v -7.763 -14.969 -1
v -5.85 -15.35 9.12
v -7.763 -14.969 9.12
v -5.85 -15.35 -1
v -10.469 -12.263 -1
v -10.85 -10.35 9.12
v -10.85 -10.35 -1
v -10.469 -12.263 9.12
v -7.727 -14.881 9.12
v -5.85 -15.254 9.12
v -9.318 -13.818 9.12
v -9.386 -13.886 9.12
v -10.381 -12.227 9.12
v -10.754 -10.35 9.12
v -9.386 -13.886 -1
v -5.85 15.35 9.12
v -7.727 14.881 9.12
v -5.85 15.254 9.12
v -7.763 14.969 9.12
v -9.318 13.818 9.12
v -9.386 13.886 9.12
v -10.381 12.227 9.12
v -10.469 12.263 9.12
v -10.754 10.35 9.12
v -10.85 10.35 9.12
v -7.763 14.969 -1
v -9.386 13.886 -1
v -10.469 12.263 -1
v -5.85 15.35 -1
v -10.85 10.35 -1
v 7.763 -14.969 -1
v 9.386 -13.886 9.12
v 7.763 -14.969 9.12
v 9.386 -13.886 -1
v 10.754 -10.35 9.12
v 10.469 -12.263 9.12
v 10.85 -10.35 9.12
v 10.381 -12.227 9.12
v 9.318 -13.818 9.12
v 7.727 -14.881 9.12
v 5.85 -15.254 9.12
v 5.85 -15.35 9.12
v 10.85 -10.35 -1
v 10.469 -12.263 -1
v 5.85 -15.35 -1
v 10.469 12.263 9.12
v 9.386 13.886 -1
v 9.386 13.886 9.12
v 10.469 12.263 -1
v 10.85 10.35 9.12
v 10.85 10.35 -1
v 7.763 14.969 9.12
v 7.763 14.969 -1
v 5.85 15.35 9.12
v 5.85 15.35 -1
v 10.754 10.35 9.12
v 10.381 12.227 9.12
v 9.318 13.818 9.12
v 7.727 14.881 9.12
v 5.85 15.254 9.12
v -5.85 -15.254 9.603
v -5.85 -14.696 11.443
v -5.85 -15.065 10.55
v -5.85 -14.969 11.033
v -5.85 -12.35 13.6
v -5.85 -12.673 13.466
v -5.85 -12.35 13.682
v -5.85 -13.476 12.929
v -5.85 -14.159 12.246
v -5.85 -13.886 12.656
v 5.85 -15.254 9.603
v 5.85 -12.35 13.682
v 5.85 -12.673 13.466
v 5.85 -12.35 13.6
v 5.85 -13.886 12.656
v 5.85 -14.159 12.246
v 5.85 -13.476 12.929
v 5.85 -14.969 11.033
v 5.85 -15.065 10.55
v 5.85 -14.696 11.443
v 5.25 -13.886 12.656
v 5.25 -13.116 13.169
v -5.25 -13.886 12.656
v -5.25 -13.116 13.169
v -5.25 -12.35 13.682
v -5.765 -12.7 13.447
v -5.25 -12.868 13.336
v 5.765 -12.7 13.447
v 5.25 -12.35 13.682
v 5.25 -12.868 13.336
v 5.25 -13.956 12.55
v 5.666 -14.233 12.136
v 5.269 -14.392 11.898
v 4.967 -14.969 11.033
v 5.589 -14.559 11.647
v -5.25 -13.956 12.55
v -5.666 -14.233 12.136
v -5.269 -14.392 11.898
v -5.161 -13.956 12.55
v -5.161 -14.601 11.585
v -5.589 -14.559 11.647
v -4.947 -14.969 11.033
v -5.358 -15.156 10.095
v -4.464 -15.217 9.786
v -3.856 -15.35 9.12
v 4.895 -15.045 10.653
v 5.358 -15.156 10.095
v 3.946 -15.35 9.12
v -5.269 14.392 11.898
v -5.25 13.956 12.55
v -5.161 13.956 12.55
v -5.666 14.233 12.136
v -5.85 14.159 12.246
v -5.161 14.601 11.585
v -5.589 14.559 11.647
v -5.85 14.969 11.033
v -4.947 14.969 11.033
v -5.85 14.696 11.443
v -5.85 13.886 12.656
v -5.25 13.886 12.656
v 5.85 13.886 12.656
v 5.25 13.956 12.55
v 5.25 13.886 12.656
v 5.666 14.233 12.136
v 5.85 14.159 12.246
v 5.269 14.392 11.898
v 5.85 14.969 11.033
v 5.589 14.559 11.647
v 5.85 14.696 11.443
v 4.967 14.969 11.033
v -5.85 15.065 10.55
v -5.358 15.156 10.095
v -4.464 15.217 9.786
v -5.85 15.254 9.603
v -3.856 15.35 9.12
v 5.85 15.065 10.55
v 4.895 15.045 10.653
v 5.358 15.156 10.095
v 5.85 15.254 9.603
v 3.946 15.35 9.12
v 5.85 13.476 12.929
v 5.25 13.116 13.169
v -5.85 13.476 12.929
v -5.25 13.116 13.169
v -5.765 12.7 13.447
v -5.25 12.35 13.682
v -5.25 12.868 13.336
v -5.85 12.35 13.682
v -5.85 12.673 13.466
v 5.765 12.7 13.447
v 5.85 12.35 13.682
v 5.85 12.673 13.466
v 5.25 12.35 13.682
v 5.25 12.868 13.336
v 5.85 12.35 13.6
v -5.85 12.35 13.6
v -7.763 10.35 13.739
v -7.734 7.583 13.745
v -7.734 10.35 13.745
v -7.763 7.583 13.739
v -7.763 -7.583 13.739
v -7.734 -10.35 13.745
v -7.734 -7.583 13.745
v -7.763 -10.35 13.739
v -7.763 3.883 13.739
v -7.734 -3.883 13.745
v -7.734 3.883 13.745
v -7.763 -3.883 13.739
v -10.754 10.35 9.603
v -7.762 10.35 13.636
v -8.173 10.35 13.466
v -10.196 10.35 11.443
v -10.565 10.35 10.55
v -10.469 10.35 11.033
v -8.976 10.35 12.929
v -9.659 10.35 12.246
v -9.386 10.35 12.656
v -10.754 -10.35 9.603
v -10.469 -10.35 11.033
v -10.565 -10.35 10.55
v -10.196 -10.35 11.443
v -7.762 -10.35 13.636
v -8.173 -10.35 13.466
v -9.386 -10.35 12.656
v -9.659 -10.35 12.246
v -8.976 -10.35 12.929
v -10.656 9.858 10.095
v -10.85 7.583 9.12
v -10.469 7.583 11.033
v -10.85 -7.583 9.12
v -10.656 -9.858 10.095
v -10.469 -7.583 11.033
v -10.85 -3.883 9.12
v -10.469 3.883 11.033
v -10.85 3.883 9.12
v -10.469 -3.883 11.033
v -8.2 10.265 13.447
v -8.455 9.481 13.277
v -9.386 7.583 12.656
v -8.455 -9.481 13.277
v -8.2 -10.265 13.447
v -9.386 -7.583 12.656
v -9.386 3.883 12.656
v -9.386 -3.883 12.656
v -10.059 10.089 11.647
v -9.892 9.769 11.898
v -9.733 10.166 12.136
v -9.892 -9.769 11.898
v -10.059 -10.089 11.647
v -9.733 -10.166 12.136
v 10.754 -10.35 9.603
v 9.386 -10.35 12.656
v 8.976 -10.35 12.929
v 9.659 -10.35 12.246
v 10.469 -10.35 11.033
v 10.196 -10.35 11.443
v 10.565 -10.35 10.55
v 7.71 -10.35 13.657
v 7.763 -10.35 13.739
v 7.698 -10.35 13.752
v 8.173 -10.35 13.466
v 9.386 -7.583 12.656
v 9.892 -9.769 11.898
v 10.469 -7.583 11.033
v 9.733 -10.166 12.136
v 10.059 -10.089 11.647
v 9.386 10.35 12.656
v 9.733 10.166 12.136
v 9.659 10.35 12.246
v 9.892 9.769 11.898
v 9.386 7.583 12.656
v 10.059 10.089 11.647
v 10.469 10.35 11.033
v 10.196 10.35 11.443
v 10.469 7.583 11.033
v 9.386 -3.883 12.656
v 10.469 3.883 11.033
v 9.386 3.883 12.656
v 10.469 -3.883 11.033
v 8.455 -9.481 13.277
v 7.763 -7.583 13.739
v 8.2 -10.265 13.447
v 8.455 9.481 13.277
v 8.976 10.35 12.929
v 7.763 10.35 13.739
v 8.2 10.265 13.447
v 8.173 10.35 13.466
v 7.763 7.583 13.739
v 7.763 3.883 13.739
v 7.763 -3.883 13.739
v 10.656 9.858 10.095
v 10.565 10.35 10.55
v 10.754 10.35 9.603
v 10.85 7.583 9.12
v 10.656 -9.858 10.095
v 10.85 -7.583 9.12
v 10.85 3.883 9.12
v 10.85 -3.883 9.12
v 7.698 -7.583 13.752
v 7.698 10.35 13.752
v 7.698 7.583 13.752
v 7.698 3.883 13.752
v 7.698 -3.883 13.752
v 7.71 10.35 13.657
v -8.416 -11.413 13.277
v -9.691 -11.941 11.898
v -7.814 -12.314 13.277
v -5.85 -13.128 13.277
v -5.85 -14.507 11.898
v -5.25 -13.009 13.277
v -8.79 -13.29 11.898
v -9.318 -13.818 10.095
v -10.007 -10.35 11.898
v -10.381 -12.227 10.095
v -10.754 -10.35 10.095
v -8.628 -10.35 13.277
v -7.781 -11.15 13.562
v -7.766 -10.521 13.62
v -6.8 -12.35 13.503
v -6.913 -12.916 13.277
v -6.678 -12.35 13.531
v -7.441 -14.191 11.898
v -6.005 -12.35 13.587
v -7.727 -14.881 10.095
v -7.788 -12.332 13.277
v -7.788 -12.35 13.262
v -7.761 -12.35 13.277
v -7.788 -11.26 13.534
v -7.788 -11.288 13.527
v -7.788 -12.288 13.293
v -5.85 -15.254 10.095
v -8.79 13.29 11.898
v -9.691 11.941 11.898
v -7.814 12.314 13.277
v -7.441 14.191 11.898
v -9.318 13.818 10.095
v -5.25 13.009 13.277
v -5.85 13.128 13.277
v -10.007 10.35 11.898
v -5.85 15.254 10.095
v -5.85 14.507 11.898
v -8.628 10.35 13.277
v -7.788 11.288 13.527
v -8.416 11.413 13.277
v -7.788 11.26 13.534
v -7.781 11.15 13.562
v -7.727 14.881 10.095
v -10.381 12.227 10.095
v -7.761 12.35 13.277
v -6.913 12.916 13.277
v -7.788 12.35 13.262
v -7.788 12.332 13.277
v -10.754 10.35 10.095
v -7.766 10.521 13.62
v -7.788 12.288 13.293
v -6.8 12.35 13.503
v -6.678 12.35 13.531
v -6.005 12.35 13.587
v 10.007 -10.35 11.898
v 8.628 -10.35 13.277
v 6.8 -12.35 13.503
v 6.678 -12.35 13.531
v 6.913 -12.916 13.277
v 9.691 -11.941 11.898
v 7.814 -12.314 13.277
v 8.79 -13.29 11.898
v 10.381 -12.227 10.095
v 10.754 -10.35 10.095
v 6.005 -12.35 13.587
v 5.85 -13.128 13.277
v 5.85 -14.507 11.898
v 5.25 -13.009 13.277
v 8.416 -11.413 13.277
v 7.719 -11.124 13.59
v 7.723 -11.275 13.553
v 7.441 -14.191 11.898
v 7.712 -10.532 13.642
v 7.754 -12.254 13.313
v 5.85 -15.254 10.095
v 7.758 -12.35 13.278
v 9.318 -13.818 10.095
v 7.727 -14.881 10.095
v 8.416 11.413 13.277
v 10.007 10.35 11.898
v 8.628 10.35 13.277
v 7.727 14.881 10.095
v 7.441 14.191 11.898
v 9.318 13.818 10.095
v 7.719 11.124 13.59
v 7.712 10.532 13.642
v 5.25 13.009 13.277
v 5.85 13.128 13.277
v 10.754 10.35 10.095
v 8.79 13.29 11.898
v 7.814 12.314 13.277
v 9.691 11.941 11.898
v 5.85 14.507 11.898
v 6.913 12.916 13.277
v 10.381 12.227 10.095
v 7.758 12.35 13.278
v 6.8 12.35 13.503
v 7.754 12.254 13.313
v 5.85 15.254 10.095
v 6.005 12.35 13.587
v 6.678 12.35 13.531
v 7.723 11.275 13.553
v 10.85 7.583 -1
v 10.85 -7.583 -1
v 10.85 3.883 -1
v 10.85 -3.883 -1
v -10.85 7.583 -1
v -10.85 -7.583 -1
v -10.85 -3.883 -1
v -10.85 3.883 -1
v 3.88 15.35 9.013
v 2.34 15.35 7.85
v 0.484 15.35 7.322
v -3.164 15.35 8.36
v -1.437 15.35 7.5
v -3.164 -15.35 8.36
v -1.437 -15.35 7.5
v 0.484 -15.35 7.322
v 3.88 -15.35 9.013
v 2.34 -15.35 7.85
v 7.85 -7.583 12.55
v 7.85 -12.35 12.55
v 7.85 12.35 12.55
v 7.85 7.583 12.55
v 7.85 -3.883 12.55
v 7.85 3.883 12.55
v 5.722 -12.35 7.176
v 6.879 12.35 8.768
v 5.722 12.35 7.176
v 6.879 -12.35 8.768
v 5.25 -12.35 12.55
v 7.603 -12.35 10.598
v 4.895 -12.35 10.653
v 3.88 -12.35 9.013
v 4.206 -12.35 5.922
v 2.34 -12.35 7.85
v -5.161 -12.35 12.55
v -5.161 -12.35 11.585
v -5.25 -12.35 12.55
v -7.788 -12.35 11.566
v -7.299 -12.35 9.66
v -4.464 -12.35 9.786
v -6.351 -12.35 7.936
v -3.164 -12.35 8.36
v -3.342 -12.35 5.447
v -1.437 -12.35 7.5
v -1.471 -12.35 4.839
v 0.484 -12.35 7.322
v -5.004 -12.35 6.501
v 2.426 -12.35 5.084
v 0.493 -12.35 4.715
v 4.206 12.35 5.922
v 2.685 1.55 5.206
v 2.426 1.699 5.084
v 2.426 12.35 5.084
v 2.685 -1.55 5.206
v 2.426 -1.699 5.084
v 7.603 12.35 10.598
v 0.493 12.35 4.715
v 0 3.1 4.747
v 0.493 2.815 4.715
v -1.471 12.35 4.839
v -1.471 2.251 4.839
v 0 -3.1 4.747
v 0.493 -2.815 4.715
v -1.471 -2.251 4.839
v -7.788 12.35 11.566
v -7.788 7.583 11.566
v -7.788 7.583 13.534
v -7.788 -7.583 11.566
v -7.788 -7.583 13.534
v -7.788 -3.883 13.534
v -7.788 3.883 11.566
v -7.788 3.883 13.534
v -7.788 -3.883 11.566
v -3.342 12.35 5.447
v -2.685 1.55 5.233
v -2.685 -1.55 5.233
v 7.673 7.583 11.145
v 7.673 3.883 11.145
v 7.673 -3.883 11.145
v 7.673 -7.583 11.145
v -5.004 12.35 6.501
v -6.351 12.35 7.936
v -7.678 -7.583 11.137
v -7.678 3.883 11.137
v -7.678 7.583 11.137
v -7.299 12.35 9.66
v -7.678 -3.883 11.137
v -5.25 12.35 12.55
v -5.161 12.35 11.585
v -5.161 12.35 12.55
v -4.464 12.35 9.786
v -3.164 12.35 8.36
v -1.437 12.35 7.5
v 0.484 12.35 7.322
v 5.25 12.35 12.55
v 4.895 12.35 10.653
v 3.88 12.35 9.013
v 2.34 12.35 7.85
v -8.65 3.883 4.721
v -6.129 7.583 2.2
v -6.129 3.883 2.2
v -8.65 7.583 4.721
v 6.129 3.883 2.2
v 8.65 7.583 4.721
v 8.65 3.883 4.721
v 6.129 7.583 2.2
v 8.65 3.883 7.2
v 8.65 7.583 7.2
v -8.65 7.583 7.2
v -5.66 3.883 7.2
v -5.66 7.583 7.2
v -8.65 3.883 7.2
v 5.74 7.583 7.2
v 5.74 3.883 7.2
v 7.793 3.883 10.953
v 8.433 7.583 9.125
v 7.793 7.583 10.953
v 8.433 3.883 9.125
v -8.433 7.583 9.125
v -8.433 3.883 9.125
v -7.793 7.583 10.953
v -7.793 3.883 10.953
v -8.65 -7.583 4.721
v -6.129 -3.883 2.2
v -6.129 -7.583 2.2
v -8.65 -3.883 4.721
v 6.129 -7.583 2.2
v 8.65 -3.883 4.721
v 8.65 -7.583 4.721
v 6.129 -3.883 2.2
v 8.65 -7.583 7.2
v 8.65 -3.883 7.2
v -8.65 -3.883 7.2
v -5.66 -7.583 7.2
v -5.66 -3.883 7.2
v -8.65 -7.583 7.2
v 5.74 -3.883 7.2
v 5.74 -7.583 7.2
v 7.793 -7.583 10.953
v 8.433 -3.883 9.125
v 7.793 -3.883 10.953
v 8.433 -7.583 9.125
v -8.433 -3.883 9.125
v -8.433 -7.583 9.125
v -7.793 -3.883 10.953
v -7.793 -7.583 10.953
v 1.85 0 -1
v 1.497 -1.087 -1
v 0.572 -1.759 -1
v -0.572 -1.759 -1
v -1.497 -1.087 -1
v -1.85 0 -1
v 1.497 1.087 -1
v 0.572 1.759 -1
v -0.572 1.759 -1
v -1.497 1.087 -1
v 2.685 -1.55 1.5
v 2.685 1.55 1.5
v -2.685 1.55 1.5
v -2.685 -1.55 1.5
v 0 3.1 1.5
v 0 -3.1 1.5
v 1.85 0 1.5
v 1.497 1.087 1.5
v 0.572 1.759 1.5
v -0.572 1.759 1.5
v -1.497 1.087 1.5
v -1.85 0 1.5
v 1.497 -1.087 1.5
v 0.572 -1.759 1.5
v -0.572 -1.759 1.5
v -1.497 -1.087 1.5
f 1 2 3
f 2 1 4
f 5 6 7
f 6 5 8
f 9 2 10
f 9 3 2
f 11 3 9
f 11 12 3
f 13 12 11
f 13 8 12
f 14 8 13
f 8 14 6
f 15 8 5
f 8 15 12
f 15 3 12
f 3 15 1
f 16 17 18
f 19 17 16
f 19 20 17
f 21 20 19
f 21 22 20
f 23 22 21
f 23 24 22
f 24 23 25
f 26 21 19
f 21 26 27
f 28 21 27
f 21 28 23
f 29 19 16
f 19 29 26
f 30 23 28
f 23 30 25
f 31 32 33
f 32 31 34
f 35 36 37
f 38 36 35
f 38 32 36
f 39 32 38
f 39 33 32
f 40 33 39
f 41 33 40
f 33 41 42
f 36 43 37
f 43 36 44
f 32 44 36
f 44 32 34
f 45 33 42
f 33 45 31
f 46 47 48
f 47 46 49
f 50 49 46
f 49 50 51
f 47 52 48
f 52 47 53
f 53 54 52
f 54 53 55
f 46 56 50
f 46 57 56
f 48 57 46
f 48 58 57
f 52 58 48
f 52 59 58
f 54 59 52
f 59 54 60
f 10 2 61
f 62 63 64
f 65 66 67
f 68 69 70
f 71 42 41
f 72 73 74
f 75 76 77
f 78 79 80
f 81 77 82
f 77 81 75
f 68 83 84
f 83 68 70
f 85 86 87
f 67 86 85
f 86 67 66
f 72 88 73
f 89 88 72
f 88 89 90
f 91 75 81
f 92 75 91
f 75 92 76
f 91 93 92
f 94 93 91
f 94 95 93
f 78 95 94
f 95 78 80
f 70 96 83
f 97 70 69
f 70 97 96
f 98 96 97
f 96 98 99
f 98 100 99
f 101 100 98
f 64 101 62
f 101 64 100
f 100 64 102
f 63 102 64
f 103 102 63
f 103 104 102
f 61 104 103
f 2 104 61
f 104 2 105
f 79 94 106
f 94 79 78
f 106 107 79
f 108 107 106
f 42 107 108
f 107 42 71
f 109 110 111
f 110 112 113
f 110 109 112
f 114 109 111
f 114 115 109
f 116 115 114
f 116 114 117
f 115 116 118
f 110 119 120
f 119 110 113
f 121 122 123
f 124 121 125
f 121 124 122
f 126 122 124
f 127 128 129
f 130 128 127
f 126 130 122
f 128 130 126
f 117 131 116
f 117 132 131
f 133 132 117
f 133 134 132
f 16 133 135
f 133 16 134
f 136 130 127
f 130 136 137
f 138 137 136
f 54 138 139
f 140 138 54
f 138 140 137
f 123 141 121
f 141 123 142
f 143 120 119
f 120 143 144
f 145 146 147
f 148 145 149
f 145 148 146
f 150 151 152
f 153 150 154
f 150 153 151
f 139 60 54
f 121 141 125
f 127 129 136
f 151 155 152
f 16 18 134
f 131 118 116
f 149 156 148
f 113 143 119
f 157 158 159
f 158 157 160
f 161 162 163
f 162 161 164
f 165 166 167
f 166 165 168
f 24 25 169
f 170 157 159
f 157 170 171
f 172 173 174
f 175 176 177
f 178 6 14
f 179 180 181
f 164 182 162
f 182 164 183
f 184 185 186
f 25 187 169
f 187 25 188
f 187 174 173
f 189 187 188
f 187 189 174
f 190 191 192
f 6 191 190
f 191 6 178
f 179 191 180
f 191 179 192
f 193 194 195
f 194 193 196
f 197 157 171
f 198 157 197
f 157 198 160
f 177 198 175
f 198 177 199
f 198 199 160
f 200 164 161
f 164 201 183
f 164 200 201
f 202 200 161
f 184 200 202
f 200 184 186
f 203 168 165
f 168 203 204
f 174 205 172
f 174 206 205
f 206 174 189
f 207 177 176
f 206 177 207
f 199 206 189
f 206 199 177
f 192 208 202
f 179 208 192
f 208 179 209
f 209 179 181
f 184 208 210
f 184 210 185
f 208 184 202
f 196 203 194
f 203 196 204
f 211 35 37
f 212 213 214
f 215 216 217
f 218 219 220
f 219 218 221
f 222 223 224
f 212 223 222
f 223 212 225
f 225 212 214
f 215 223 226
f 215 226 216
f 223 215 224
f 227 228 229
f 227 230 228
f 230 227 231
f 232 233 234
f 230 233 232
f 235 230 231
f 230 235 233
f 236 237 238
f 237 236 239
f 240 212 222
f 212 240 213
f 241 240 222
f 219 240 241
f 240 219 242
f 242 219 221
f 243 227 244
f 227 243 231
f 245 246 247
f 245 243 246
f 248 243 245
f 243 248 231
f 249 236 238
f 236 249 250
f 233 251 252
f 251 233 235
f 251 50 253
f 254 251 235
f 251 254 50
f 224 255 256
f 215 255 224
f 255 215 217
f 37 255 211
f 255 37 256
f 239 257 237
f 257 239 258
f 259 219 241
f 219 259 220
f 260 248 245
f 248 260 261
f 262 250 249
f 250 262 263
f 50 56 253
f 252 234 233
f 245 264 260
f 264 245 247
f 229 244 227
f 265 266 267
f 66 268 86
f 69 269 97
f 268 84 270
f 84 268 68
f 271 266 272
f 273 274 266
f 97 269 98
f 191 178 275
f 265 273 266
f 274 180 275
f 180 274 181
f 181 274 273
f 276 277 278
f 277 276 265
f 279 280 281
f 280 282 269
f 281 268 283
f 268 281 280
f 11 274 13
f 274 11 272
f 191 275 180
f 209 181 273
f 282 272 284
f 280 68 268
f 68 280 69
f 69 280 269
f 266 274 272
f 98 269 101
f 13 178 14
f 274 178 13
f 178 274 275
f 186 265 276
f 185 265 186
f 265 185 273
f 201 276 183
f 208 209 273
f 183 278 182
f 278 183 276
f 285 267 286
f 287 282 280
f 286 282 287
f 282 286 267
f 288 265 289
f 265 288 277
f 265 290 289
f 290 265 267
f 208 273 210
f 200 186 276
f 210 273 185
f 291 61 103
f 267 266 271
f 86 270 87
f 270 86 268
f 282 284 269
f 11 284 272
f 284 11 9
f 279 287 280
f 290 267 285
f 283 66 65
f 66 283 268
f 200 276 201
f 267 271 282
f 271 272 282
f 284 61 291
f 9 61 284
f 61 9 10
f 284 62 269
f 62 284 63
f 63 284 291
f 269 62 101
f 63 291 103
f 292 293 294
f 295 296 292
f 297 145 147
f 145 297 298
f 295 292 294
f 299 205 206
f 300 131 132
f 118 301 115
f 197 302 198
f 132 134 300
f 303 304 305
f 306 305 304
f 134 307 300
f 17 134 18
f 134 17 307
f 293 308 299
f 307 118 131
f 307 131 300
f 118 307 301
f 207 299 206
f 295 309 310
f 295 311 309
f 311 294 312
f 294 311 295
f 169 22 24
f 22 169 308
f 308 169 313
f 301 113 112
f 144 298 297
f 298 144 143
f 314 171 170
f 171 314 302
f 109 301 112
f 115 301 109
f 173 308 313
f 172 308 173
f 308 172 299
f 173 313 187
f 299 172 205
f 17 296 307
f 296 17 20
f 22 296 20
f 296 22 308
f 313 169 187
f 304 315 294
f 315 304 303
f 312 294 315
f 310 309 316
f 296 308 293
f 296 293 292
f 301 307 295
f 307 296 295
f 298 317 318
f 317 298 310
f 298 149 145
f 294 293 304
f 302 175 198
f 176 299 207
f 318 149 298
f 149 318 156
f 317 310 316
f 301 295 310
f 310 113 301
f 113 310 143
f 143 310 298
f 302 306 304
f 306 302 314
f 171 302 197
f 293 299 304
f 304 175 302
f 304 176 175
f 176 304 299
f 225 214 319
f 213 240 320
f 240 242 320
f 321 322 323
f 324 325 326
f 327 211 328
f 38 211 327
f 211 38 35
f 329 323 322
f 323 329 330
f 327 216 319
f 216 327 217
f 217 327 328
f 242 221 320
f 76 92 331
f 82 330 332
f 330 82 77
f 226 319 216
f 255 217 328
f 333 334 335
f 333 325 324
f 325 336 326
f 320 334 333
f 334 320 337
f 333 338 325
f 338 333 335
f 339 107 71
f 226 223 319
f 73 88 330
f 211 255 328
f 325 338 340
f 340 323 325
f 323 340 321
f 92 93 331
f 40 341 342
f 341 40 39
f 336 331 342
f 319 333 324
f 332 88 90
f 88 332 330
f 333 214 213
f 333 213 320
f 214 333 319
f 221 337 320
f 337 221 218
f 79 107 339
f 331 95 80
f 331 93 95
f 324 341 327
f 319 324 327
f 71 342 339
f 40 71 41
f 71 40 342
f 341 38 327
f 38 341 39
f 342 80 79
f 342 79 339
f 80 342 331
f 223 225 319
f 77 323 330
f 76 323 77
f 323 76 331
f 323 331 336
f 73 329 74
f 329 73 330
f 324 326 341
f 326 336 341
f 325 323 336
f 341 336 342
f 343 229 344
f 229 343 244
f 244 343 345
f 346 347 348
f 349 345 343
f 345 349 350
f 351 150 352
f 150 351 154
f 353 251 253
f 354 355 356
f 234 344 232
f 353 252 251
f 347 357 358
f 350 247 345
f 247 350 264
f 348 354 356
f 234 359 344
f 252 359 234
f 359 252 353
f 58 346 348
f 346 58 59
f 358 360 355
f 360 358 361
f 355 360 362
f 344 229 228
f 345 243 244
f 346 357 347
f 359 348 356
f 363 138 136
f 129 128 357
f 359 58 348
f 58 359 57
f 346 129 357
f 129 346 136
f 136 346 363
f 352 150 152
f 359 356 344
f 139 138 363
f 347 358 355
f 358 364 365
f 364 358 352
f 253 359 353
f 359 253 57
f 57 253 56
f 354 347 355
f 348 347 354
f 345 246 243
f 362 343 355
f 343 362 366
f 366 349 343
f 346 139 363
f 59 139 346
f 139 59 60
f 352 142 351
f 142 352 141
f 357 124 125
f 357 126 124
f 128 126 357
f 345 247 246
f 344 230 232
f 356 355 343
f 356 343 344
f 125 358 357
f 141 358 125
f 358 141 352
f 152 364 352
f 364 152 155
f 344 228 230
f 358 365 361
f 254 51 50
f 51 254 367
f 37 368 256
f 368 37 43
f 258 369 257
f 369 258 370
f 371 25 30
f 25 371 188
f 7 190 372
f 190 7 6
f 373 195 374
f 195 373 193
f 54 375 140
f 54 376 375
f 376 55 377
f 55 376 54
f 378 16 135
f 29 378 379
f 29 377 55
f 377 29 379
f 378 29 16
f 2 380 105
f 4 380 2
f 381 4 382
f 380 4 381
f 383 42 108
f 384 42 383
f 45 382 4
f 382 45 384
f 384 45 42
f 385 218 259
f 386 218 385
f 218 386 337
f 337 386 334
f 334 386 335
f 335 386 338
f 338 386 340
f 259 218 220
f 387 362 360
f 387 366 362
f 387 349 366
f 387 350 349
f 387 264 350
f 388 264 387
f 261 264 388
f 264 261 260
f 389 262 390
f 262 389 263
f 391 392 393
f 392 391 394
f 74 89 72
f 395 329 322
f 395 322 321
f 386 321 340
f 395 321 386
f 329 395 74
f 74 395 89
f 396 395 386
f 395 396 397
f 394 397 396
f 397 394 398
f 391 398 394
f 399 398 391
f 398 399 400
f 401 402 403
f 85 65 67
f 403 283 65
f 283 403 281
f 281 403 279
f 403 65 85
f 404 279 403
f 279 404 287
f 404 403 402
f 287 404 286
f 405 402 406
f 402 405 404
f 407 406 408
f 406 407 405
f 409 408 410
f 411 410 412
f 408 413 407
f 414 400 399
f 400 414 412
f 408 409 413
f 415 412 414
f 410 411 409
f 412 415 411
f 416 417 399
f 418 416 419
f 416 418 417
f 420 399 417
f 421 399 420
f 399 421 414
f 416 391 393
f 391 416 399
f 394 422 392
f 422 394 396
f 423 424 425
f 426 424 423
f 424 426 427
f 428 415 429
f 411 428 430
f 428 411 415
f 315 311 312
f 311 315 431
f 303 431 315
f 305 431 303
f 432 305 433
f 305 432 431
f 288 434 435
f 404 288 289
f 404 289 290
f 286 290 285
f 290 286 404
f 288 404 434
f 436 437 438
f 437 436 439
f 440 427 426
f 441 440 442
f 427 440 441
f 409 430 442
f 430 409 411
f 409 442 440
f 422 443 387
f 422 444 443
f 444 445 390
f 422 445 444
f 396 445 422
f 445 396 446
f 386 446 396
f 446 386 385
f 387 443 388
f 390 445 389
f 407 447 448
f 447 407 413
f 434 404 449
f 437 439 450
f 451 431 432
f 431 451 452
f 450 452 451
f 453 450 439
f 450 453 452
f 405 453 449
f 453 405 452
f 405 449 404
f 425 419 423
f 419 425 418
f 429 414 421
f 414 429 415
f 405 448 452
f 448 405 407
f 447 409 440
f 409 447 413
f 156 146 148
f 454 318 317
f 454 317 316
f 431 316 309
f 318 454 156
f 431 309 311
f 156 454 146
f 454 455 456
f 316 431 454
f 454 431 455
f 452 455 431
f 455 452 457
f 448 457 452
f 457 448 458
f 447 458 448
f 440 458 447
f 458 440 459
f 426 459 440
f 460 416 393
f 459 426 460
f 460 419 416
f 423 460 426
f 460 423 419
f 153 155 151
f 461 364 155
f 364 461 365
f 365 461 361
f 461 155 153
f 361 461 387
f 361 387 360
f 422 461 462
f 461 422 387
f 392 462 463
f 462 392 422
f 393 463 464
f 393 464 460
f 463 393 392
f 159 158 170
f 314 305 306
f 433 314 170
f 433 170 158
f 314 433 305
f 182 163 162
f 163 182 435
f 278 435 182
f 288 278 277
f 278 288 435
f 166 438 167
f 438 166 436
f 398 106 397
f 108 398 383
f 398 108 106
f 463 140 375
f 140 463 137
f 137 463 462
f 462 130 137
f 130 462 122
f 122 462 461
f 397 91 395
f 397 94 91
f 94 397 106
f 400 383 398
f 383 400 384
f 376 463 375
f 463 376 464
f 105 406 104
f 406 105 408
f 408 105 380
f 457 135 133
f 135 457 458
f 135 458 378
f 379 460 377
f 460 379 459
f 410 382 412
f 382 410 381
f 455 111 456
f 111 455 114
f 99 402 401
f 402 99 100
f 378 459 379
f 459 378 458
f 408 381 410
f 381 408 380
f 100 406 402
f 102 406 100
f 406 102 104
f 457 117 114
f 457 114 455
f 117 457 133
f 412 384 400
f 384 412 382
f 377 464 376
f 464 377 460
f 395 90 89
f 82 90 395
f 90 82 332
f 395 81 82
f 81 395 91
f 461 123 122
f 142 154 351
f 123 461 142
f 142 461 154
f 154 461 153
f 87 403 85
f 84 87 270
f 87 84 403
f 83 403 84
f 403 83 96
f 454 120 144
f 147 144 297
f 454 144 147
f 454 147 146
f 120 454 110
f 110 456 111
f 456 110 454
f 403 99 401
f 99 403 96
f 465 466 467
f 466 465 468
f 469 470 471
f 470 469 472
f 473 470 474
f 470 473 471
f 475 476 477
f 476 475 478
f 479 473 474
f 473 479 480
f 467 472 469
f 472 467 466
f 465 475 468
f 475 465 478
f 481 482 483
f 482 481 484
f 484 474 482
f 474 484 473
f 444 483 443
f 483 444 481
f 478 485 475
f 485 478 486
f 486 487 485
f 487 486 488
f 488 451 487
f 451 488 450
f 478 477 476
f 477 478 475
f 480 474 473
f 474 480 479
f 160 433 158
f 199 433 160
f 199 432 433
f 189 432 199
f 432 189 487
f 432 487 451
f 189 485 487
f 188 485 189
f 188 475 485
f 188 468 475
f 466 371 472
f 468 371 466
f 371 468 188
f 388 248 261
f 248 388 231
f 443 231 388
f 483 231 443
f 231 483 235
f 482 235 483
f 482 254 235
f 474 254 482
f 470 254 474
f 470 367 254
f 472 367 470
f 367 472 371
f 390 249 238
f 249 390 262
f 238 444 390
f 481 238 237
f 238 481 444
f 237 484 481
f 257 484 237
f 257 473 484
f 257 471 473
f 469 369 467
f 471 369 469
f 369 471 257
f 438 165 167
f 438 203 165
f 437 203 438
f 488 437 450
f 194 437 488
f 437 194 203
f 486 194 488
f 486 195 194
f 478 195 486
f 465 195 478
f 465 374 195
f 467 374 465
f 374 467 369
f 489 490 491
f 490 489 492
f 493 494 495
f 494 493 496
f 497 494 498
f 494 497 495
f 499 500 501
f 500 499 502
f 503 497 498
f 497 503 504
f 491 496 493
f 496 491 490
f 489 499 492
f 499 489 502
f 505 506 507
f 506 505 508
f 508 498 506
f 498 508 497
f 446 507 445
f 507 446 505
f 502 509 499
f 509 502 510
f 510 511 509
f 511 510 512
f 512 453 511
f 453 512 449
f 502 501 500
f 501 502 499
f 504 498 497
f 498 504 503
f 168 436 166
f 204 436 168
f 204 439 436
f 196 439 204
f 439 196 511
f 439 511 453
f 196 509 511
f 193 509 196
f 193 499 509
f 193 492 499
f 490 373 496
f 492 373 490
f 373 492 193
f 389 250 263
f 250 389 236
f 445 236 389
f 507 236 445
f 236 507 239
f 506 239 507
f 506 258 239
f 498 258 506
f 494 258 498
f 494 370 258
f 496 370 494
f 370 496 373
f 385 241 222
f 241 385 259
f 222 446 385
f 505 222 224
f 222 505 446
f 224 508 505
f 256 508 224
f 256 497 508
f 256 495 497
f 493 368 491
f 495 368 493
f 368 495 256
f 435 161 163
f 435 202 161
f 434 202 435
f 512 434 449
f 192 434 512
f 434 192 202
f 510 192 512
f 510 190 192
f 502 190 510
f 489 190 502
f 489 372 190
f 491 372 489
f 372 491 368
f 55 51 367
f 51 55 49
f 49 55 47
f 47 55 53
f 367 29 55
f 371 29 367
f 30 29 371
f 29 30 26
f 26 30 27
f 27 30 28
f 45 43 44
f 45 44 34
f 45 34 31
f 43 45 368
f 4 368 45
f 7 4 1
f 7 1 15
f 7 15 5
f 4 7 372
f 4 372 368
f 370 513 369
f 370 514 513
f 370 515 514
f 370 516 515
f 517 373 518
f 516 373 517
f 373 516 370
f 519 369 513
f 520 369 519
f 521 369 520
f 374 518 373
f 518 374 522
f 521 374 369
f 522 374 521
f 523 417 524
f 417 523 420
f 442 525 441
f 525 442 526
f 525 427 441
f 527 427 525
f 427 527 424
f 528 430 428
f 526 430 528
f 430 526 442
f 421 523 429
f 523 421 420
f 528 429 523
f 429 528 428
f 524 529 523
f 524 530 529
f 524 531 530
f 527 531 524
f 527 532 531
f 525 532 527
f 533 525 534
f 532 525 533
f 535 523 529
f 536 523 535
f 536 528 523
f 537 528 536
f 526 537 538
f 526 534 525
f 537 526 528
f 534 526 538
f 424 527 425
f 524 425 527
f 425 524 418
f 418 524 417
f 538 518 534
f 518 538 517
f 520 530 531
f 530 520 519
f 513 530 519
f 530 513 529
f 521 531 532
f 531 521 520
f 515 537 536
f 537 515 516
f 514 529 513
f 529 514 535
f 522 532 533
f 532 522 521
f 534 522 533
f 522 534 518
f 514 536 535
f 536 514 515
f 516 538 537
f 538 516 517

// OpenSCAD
include <MCAD/boxes.scad>

clearance = 0.7;

lm8uu_diameter=15+clearance;
lm8uu_length=24+clearance;
lm8uu_support_thickness=3;
m8_diameter = 9;

lm8uu_end_diameter=m8_diameter+1.5;

m3_nut_thickness = 2.5;
zip_width = 3 + clearance;
zip_thickness = 1.5 + clearance;

lm8uu_holder_width=lm8uu_diameter+2*lm8uu_support_thickness;
lm8uu_holder_length=lm8uu_length+2*lm8uu_support_thickness;
lm8uu_holder_height=lm8uu_diameter*0.6+lm8uu_support_thickness*0.5 + m3_nut_thickness +clearance;
lm8uu_holder_gap=(lm8uu_holder_length-6*lm8uu_support_thickness)/2.0;
roundrad = 5;

module ziptie()
{
	off = 5;

	difference()
	{
		translate([0,0,(lm8uu_holder_height-5)/2])
			cube([lm8uu_holder_width, zip_width, lm8uu_holder_height+5], center=true);
	  
			difference()
			{
				translate([0,0,zip_thickness+off/2])
					cube([lm8uu_holder_width-zip_thickness*2, zip_width+1, off], center=true);
				for (rpt=[-13,13])
				{
					translate([rpt,0,2])
						rotate([0,45,0])
							cube([10,10,10], center = true);
				}
			}
		translate([0,0,zip_thickness+off])
			difference()
			{
				rotate([90,0,0])
					cylinder(h = 5, r=lm8uu_holder_width/2.0-zip_thickness, center=true);
				translate([0,0,-50])
					cube([100,100,100],center=true);
			}

	}
}

module lm8uu_holder()
{
	shift = (lm8uu_holder_length-zip_width*2)/6.0+zip_width/2;

	difference()
	{
		translate([0,0,(lm8uu_holder_height-roundrad-5)*0.5])
			roundedBox([lm8uu_holder_width,lm8uu_holder_length,lm8uu_holder_height+roundrad+5], roundrad, false);
		translate([0,0,-lm8uu_holder_height*0.5-1])
			cube([lm8uu_holder_width*2,lm8uu_holder_length*2,lm8uu_holder_height], center = true);
	  
		translate([0, 0, lm8uu_diameter*.5 + lm8uu_support_thickness*0.5 + clearance + m3_nut_thickness])
		{
			rotate([90,0,0])
			{
				cylinder(r=lm8uu_diameter*0.5, h=lm8uu_length, center=true);
				translate([0,5,0])
					cube([lm8uu_diameter*0.98, 10, lm8uu_length], center=true);
			}

			rotate([-90,0,0])
			{
				cylinder(r=lm8uu_end_diameter/2,h=lm8uu_holder_length+2, center=true);
				translate([0,-lm8uu_end_diameter*.5,0])
					cube([lm8uu_end_diameter, lm8uu_end_diameter, lm8uu_holder_length+2], center=true);
			}
		}
		
		// m3 nut
		translate([0,0,lm8uu_support_thickness*.5])
			rotate([0,0,90])
				cylinder(r=6.2/2, h=10, $fn=6);
		cylinder(r=1.5+clearance/2.0,h=20, center=true, $fn=10);
		
		translate([0,shift,0])
			ziptie();
		translate([0,-shift,0])
			ziptie();
	}
}

lm8uu_holder();
